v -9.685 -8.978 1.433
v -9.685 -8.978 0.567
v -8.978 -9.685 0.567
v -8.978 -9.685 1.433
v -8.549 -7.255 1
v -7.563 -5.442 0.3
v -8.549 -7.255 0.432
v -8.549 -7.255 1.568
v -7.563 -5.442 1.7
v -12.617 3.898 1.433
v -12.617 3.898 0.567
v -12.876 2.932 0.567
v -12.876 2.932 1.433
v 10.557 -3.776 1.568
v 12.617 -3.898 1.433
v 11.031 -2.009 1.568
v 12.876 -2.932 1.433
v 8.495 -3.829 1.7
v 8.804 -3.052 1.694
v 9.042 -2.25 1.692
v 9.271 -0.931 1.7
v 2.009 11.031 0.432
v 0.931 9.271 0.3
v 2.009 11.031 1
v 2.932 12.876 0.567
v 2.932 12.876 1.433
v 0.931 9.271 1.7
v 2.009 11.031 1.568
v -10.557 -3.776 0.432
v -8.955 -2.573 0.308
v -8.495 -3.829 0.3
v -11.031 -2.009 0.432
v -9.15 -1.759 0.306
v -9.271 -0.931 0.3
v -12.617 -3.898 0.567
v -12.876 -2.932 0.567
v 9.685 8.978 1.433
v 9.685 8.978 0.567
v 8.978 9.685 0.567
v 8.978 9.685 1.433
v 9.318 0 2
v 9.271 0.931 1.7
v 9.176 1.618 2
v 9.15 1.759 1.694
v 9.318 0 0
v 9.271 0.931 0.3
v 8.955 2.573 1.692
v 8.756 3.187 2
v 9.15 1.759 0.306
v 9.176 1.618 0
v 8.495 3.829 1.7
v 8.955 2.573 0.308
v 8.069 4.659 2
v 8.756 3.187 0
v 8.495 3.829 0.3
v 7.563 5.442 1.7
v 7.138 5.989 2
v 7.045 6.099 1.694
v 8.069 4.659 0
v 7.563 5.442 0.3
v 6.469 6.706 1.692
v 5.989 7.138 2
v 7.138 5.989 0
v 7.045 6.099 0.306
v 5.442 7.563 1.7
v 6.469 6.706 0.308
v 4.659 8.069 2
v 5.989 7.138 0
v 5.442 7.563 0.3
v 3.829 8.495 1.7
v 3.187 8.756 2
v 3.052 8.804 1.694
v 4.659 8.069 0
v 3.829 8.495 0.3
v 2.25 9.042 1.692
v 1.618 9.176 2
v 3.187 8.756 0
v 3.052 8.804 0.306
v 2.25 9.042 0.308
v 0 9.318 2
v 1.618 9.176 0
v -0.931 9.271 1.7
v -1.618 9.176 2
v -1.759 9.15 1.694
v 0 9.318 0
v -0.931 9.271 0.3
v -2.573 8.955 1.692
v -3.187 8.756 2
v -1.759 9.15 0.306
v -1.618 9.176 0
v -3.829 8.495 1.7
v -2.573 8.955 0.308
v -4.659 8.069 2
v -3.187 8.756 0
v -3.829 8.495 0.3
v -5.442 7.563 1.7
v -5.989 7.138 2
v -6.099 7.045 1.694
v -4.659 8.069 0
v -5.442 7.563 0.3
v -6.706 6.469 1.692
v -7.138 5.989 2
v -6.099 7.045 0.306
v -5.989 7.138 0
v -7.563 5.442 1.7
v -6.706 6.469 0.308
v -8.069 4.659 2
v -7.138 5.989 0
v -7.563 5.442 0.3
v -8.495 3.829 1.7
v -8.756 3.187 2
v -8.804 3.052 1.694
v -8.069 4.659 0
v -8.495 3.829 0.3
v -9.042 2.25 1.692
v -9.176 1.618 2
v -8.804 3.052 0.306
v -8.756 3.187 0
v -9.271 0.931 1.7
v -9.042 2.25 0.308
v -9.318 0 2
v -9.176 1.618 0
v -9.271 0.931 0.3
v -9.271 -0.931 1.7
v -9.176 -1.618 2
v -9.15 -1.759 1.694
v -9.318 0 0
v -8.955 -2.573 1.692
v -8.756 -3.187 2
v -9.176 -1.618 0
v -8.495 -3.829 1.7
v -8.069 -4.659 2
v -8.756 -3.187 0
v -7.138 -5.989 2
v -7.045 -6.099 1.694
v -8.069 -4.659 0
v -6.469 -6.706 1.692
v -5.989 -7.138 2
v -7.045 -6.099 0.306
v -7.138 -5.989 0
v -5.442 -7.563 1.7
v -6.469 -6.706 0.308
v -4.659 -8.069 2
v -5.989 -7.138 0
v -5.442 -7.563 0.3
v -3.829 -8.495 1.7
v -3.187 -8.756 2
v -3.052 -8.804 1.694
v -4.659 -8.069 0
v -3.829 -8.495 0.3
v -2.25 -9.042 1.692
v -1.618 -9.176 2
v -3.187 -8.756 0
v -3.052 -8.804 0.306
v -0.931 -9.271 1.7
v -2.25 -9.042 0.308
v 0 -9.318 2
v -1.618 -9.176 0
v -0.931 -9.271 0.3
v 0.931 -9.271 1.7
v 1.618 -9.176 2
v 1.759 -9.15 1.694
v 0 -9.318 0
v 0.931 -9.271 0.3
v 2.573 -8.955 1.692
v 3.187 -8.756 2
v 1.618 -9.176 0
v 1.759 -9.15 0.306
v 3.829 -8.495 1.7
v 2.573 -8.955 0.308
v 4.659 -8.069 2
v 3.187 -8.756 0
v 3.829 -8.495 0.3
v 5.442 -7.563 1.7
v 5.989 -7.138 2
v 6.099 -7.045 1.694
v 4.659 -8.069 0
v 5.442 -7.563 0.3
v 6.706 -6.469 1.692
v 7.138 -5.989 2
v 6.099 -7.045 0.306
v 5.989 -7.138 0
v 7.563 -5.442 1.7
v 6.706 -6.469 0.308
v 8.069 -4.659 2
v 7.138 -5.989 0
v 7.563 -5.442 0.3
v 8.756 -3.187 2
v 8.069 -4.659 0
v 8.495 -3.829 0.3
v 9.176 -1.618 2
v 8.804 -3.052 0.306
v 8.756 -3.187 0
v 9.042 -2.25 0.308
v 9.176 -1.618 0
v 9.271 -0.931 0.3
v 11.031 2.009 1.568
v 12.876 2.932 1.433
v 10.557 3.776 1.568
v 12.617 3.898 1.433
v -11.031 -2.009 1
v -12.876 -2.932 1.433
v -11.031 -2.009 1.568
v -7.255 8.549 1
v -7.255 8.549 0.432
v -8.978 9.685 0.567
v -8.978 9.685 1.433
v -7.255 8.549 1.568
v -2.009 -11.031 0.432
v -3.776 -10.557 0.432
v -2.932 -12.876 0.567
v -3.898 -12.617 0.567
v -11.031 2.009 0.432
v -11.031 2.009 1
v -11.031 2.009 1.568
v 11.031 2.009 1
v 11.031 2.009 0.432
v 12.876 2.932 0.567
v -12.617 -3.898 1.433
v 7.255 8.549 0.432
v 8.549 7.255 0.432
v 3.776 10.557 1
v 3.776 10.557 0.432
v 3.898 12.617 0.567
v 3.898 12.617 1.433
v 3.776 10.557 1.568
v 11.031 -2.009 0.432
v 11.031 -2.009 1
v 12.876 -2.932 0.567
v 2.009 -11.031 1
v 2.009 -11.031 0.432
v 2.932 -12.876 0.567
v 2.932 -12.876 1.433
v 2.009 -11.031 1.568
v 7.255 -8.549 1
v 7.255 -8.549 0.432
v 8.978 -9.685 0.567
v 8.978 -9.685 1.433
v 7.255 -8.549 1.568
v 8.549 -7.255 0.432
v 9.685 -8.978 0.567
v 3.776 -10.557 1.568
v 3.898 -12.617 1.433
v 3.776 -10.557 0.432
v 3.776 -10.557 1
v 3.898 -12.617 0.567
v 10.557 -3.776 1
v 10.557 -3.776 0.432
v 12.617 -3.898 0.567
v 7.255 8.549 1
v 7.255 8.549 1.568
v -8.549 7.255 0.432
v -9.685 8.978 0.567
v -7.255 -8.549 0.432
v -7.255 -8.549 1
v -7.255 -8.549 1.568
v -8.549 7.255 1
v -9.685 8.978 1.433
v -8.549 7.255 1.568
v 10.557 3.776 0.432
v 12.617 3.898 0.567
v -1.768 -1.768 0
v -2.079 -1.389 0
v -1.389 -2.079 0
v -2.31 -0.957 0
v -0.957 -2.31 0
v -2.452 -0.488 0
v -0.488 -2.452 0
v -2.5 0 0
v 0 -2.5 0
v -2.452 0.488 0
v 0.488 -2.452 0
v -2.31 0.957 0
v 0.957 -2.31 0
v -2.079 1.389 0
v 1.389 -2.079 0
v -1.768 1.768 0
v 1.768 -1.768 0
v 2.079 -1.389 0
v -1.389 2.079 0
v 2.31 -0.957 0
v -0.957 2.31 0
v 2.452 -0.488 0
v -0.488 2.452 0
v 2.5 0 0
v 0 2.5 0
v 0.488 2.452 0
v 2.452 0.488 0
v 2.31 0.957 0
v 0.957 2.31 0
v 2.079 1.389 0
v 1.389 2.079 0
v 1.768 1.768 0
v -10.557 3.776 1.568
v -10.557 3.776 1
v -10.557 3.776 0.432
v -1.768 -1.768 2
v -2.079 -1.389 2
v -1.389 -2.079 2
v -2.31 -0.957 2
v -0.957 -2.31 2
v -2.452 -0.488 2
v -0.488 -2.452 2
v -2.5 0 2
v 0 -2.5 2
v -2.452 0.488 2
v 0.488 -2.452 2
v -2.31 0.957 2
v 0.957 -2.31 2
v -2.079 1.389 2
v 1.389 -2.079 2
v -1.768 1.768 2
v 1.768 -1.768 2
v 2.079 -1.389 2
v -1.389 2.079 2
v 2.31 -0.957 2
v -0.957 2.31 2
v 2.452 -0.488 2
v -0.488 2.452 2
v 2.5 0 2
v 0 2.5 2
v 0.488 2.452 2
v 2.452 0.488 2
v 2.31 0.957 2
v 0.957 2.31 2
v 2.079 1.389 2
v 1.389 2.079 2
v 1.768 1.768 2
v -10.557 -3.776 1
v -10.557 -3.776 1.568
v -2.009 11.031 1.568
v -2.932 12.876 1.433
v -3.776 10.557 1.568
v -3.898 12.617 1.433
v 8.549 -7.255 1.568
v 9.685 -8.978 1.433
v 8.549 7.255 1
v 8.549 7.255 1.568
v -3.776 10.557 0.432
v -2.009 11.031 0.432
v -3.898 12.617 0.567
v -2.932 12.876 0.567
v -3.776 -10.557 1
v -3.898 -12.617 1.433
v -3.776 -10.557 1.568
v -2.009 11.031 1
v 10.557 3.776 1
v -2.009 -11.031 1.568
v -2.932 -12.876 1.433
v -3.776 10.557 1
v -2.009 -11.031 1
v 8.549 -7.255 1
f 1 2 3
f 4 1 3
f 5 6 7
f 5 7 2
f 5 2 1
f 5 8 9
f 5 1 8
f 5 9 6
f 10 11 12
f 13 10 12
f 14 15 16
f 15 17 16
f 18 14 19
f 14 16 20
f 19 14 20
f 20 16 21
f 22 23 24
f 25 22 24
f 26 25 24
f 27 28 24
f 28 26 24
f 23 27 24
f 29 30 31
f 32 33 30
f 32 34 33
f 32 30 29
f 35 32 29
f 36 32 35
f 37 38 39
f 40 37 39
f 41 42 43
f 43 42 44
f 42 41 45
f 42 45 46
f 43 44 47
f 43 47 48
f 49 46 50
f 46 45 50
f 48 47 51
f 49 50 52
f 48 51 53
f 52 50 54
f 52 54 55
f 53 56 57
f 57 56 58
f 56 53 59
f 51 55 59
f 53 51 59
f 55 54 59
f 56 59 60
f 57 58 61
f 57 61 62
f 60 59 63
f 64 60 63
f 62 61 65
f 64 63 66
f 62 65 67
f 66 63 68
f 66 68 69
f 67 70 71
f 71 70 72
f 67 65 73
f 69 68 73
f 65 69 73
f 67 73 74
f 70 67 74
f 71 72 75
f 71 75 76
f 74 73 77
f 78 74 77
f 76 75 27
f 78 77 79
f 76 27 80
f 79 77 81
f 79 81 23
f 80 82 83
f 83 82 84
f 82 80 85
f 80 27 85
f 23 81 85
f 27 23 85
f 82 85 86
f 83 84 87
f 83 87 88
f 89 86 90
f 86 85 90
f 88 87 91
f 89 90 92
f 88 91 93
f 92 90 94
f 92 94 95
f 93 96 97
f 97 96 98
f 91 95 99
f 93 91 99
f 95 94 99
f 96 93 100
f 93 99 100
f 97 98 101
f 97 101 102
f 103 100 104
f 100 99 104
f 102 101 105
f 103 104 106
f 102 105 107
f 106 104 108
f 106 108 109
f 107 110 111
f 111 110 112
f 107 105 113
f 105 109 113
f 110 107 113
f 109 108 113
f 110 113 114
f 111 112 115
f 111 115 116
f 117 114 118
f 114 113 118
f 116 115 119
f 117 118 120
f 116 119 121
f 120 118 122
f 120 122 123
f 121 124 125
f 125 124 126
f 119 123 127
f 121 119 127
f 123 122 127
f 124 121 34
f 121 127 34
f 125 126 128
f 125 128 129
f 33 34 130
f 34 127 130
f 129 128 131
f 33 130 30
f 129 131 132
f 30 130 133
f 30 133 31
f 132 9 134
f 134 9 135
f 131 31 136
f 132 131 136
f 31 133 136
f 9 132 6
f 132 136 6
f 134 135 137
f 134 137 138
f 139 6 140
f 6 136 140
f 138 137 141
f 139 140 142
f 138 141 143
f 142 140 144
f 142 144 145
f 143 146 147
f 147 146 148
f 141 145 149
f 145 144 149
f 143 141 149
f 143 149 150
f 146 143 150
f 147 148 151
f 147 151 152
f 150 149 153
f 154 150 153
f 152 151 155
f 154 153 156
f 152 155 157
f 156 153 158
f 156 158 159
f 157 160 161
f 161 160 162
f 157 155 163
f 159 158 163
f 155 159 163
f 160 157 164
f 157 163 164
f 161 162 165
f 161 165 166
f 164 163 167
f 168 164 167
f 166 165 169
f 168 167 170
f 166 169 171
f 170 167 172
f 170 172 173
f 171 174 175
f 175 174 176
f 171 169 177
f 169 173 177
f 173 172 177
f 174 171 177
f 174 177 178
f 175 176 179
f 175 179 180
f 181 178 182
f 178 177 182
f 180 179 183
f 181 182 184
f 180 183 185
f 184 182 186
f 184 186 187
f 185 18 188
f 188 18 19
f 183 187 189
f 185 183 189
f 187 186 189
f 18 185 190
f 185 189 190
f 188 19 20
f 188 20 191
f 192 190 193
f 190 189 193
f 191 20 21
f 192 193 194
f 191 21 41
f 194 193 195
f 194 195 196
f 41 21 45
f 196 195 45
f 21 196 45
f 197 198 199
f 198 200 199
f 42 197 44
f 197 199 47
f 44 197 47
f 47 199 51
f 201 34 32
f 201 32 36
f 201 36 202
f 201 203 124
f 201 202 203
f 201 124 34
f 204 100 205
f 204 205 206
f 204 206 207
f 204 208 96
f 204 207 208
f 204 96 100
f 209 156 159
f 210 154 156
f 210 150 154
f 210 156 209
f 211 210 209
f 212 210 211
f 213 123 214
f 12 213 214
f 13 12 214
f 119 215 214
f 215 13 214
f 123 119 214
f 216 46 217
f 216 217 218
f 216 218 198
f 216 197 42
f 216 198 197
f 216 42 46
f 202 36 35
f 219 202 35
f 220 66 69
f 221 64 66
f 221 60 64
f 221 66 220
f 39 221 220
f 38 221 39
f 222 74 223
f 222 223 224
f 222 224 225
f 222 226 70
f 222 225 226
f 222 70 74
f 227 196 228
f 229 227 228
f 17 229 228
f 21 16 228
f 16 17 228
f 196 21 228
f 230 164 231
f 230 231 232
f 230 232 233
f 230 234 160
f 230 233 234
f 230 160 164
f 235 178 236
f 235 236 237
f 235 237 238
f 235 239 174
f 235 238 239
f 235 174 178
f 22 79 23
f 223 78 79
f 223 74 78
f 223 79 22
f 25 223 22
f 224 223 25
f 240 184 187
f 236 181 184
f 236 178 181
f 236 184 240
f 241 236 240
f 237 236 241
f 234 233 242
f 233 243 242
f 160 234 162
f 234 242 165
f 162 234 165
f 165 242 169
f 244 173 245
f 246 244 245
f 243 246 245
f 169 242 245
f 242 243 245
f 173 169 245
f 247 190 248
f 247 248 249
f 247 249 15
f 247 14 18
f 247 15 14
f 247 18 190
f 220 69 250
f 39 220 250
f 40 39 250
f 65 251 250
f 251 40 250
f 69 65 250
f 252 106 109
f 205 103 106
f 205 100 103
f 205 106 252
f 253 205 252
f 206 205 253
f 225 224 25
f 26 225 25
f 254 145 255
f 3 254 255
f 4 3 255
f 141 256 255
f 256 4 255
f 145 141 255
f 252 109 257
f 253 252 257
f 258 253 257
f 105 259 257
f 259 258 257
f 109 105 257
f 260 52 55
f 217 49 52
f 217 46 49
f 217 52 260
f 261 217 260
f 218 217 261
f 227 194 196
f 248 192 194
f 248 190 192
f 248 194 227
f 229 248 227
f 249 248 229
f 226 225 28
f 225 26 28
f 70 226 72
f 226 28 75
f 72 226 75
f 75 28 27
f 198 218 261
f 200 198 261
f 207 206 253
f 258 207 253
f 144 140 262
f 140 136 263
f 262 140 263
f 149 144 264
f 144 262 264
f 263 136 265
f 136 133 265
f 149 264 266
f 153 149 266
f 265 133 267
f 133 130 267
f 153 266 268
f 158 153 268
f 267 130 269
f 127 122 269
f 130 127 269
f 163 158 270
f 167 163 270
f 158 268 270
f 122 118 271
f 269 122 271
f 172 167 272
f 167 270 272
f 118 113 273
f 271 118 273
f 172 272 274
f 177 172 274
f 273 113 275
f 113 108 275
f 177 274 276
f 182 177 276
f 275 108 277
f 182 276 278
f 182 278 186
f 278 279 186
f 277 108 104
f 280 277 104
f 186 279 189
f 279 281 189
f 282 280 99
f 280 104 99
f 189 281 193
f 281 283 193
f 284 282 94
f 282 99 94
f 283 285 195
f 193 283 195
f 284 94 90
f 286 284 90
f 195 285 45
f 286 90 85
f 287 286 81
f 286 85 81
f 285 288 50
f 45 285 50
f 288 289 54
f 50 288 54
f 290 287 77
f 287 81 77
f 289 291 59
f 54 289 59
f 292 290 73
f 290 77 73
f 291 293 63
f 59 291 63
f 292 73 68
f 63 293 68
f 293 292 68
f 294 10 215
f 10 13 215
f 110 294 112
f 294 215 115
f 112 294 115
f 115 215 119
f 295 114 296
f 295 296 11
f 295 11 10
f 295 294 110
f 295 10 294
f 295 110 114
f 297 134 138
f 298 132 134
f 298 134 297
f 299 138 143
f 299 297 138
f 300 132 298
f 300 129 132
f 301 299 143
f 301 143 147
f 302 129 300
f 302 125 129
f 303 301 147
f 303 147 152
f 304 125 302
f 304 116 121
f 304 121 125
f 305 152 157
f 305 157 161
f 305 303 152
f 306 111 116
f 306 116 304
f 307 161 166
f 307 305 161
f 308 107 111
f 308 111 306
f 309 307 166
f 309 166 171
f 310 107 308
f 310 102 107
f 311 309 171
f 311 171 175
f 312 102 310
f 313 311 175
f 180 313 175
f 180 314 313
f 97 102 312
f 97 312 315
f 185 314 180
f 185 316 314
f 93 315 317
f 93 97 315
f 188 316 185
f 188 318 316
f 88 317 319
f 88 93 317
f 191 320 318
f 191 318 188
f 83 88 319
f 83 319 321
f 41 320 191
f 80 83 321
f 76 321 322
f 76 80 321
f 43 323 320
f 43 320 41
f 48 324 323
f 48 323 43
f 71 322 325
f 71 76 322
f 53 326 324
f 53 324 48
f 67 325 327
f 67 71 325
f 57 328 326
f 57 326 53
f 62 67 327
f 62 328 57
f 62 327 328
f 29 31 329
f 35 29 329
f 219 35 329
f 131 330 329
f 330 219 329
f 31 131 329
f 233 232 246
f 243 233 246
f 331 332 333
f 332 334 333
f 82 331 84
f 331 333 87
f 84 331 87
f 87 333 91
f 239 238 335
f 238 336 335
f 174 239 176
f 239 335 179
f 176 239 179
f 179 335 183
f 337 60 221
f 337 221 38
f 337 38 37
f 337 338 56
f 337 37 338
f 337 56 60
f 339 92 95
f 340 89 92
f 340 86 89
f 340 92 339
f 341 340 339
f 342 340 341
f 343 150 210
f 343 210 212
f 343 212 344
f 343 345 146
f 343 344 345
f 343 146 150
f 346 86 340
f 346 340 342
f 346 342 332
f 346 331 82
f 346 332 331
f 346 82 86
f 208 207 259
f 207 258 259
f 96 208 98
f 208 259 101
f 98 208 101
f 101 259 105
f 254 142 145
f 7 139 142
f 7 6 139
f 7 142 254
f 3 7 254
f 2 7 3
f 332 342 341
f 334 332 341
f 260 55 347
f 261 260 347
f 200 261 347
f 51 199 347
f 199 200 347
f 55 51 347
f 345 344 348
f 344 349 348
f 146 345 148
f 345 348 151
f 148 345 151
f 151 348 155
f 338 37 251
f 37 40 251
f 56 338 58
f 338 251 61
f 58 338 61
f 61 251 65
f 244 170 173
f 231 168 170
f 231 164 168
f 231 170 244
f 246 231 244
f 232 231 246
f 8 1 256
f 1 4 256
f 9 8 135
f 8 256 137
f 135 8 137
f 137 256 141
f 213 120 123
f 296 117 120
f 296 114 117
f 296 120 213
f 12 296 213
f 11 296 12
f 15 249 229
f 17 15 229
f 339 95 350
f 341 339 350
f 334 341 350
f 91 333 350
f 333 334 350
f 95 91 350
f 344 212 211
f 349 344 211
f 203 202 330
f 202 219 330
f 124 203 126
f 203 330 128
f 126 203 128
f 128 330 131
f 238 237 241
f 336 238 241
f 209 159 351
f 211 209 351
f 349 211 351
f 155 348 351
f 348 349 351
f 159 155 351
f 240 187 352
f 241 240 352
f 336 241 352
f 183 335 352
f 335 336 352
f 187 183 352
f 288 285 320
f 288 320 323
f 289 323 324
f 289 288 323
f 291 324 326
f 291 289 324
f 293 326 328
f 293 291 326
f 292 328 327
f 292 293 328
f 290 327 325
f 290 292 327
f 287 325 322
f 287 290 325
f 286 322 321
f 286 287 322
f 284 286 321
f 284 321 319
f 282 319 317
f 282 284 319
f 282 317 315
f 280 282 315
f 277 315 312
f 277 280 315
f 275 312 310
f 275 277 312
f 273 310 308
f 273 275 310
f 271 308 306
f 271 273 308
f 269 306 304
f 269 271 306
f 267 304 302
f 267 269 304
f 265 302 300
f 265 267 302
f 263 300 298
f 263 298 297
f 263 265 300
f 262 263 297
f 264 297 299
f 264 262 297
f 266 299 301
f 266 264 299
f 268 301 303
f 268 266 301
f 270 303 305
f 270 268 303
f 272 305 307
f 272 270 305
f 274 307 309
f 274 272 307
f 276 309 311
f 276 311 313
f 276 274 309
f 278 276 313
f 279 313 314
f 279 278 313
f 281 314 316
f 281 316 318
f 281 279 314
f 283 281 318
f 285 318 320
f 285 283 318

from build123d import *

# Parameters (mm, degrees)
BOSS_EXTRUDE1_DEPTH = 2
CUT_EXTRUDE1_DEPTH  = 2
CIRPATTERN1_COUNT   = 12
SKETCH6_R           = 9.317683155
SKETCH6_R_2         = 2.5
BOSS_EXTRUDE2_DEPTH = 2


with BuildPart() as part:
    # Sketch3 → Boss-Extrude1 (new body)
    with BuildSketch(Plane.XY):
        with BuildLine():
            Line((-7.563321911, 5.442001567), (-5.442001567, 7.563321911))
            add(Edge.make_bspline(
                [(-8.977535473, 9.684642254), (-7.300218474, 8.473386816), (-5.442001567, 7.563321911)],
                knots=[0, 0, 0, 1, 1, 1], degree=2))
            Line((-8.977535473, 9.684642254), (-9.684642254, 8.977535473))
            add(Edge.make_bspline(
                [(-9.684642254, 8.977535473), (-8.473386816, 7.300218474), (-7.563321911, 5.442001567)],
                knots=[0, 0, 0, 1, 1, 1], degree=2))
        make_face()
    extrude(amount=BOSS_EXTRUDE1_DEPTH)

    # Sketch4 → Cut-Extrude1 (cut, symmetric)
    with BuildSketch(Plane(origin=(0, 0, 0), x_dir=(0, 0, -1), z_dir=(-0.707106781186548, -0.7071067811865471, 0))):
        Polygon((0, -9.196152423), (-0.3, -9.196152423), (-0.6, -13.696152423), (0, -13.696152423), align=None)
        Polygon((-1.7, -9.196152423), (-2, -9.196152423), (-2, -13.696152423), (-1.4, -13.696152423), align=None)
    extrude(amount=CUT_EXTRUDE1_DEPTH, both=True, mode=Mode.SUBTRACT)


with BuildPart() as cirpattern1_1:
    # CirPattern1: pattern copy
    add(part.part.rotate(Axis((0, 0, 0), (0, 0, -1)), 1 * 360 / CIRPATTERN1_COUNT))


with BuildPart() as cirpattern1_2:
    # CirPattern1: pattern copy
    add(part.part.rotate(Axis((0, 0, 0), (0, 0, -1)), 2 * 360 / CIRPATTERN1_COUNT))


with BuildPart() as cirpattern1_3:
    # CirPattern1: pattern copy
    add(part.part.rotate(Axis((0, 0, 0), (0, 0, -1)), 3 * 360 / CIRPATTERN1_COUNT))


with BuildPart() as cirpattern1_4:
    # CirPattern1: pattern copy
    add(part.part.rotate(Axis((0, 0, 0), (0, 0, -1)), 4 * 360 / CIRPATTERN1_COUNT))


with BuildPart() as cirpattern1_5:
    # CirPattern1: pattern copy
    add(part.part.rotate(Axis((0, 0, 0), (0, 0, -1)), 5 * 360 / CIRPATTERN1_COUNT))


with BuildPart() as cirpattern1_6:
    # CirPattern1: pattern copy
    add(part.part.rotate(Axis((0, 0, 0), (0, 0, -1)), 6 * 360 / CIRPATTERN1_COUNT))


with BuildPart() as cirpattern1_7:
    # CirPattern1: pattern copy
    add(part.part.rotate(Axis((0, 0, 0), (0, 0, -1)), 7 * 360 / CIRPATTERN1_COUNT))


with BuildPart() as cirpattern1_8:
    # CirPattern1: pattern copy
    add(part.part.rotate(Axis((0, 0, 0), (0, 0, -1)), 8 * 360 / CIRPATTERN1_COUNT))


with BuildPart() as cirpattern1_9:
    # CirPattern1: pattern copy
    add(part.part.rotate(Axis((0, 0, 0), (0, 0, -1)), 9 * 360 / CIRPATTERN1_COUNT))


with BuildPart() as cirpattern1_10:
    # CirPattern1: pattern copy
    add(part.part.rotate(Axis((0, 0, 0), (0, 0, -1)), 10 * 360 / CIRPATTERN1_COUNT))


with BuildPart() as cirpattern1_11:
    # CirPattern1: pattern copy
    add(part.part.rotate(Axis((0, 0, 0), (0, 0, -1)), 11 * 360 / CIRPATTERN1_COUNT))


with BuildPart() as part_1:
    add(part.part)

    add(cirpattern1_1.part)  # Boss-Extrude2 merges CirPattern1_1

    add(cirpattern1_2.part)  # Boss-Extrude2 merges CirPattern1_2

    add(cirpattern1_3.part)  # Boss-Extrude2 merges CirPattern1_3

    add(cirpattern1_4.part)  # Boss-Extrude2 merges CirPattern1_4

    add(cirpattern1_5.part)  # Boss-Extrude2 merges CirPattern1_5

    add(cirpattern1_6.part)  # Boss-Extrude2 merges CirPattern1_6

    add(cirpattern1_7.part)  # Boss-Extrude2 merges CirPattern1_7

    add(cirpattern1_8.part)  # Boss-Extrude2 merges CirPattern1_8

    add(cirpattern1_9.part)  # Boss-Extrude2 merges CirPattern1_9

    add(cirpattern1_10.part)  # Boss-Extrude2 merges CirPattern1_10

    add(cirpattern1_11.part)  # Boss-Extrude2 merges CirPattern1_11
    # Sketch6 → Boss-Extrude2 (add)
    with BuildSketch(Plane.XY):
        Circle(SKETCH6_R)
        Circle(SKETCH6_R_2, mode=Mode.SUBTRACT)
    extrude(amount=BOSS_EXTRUDE2_DEPTH)


solid = part_1.part
